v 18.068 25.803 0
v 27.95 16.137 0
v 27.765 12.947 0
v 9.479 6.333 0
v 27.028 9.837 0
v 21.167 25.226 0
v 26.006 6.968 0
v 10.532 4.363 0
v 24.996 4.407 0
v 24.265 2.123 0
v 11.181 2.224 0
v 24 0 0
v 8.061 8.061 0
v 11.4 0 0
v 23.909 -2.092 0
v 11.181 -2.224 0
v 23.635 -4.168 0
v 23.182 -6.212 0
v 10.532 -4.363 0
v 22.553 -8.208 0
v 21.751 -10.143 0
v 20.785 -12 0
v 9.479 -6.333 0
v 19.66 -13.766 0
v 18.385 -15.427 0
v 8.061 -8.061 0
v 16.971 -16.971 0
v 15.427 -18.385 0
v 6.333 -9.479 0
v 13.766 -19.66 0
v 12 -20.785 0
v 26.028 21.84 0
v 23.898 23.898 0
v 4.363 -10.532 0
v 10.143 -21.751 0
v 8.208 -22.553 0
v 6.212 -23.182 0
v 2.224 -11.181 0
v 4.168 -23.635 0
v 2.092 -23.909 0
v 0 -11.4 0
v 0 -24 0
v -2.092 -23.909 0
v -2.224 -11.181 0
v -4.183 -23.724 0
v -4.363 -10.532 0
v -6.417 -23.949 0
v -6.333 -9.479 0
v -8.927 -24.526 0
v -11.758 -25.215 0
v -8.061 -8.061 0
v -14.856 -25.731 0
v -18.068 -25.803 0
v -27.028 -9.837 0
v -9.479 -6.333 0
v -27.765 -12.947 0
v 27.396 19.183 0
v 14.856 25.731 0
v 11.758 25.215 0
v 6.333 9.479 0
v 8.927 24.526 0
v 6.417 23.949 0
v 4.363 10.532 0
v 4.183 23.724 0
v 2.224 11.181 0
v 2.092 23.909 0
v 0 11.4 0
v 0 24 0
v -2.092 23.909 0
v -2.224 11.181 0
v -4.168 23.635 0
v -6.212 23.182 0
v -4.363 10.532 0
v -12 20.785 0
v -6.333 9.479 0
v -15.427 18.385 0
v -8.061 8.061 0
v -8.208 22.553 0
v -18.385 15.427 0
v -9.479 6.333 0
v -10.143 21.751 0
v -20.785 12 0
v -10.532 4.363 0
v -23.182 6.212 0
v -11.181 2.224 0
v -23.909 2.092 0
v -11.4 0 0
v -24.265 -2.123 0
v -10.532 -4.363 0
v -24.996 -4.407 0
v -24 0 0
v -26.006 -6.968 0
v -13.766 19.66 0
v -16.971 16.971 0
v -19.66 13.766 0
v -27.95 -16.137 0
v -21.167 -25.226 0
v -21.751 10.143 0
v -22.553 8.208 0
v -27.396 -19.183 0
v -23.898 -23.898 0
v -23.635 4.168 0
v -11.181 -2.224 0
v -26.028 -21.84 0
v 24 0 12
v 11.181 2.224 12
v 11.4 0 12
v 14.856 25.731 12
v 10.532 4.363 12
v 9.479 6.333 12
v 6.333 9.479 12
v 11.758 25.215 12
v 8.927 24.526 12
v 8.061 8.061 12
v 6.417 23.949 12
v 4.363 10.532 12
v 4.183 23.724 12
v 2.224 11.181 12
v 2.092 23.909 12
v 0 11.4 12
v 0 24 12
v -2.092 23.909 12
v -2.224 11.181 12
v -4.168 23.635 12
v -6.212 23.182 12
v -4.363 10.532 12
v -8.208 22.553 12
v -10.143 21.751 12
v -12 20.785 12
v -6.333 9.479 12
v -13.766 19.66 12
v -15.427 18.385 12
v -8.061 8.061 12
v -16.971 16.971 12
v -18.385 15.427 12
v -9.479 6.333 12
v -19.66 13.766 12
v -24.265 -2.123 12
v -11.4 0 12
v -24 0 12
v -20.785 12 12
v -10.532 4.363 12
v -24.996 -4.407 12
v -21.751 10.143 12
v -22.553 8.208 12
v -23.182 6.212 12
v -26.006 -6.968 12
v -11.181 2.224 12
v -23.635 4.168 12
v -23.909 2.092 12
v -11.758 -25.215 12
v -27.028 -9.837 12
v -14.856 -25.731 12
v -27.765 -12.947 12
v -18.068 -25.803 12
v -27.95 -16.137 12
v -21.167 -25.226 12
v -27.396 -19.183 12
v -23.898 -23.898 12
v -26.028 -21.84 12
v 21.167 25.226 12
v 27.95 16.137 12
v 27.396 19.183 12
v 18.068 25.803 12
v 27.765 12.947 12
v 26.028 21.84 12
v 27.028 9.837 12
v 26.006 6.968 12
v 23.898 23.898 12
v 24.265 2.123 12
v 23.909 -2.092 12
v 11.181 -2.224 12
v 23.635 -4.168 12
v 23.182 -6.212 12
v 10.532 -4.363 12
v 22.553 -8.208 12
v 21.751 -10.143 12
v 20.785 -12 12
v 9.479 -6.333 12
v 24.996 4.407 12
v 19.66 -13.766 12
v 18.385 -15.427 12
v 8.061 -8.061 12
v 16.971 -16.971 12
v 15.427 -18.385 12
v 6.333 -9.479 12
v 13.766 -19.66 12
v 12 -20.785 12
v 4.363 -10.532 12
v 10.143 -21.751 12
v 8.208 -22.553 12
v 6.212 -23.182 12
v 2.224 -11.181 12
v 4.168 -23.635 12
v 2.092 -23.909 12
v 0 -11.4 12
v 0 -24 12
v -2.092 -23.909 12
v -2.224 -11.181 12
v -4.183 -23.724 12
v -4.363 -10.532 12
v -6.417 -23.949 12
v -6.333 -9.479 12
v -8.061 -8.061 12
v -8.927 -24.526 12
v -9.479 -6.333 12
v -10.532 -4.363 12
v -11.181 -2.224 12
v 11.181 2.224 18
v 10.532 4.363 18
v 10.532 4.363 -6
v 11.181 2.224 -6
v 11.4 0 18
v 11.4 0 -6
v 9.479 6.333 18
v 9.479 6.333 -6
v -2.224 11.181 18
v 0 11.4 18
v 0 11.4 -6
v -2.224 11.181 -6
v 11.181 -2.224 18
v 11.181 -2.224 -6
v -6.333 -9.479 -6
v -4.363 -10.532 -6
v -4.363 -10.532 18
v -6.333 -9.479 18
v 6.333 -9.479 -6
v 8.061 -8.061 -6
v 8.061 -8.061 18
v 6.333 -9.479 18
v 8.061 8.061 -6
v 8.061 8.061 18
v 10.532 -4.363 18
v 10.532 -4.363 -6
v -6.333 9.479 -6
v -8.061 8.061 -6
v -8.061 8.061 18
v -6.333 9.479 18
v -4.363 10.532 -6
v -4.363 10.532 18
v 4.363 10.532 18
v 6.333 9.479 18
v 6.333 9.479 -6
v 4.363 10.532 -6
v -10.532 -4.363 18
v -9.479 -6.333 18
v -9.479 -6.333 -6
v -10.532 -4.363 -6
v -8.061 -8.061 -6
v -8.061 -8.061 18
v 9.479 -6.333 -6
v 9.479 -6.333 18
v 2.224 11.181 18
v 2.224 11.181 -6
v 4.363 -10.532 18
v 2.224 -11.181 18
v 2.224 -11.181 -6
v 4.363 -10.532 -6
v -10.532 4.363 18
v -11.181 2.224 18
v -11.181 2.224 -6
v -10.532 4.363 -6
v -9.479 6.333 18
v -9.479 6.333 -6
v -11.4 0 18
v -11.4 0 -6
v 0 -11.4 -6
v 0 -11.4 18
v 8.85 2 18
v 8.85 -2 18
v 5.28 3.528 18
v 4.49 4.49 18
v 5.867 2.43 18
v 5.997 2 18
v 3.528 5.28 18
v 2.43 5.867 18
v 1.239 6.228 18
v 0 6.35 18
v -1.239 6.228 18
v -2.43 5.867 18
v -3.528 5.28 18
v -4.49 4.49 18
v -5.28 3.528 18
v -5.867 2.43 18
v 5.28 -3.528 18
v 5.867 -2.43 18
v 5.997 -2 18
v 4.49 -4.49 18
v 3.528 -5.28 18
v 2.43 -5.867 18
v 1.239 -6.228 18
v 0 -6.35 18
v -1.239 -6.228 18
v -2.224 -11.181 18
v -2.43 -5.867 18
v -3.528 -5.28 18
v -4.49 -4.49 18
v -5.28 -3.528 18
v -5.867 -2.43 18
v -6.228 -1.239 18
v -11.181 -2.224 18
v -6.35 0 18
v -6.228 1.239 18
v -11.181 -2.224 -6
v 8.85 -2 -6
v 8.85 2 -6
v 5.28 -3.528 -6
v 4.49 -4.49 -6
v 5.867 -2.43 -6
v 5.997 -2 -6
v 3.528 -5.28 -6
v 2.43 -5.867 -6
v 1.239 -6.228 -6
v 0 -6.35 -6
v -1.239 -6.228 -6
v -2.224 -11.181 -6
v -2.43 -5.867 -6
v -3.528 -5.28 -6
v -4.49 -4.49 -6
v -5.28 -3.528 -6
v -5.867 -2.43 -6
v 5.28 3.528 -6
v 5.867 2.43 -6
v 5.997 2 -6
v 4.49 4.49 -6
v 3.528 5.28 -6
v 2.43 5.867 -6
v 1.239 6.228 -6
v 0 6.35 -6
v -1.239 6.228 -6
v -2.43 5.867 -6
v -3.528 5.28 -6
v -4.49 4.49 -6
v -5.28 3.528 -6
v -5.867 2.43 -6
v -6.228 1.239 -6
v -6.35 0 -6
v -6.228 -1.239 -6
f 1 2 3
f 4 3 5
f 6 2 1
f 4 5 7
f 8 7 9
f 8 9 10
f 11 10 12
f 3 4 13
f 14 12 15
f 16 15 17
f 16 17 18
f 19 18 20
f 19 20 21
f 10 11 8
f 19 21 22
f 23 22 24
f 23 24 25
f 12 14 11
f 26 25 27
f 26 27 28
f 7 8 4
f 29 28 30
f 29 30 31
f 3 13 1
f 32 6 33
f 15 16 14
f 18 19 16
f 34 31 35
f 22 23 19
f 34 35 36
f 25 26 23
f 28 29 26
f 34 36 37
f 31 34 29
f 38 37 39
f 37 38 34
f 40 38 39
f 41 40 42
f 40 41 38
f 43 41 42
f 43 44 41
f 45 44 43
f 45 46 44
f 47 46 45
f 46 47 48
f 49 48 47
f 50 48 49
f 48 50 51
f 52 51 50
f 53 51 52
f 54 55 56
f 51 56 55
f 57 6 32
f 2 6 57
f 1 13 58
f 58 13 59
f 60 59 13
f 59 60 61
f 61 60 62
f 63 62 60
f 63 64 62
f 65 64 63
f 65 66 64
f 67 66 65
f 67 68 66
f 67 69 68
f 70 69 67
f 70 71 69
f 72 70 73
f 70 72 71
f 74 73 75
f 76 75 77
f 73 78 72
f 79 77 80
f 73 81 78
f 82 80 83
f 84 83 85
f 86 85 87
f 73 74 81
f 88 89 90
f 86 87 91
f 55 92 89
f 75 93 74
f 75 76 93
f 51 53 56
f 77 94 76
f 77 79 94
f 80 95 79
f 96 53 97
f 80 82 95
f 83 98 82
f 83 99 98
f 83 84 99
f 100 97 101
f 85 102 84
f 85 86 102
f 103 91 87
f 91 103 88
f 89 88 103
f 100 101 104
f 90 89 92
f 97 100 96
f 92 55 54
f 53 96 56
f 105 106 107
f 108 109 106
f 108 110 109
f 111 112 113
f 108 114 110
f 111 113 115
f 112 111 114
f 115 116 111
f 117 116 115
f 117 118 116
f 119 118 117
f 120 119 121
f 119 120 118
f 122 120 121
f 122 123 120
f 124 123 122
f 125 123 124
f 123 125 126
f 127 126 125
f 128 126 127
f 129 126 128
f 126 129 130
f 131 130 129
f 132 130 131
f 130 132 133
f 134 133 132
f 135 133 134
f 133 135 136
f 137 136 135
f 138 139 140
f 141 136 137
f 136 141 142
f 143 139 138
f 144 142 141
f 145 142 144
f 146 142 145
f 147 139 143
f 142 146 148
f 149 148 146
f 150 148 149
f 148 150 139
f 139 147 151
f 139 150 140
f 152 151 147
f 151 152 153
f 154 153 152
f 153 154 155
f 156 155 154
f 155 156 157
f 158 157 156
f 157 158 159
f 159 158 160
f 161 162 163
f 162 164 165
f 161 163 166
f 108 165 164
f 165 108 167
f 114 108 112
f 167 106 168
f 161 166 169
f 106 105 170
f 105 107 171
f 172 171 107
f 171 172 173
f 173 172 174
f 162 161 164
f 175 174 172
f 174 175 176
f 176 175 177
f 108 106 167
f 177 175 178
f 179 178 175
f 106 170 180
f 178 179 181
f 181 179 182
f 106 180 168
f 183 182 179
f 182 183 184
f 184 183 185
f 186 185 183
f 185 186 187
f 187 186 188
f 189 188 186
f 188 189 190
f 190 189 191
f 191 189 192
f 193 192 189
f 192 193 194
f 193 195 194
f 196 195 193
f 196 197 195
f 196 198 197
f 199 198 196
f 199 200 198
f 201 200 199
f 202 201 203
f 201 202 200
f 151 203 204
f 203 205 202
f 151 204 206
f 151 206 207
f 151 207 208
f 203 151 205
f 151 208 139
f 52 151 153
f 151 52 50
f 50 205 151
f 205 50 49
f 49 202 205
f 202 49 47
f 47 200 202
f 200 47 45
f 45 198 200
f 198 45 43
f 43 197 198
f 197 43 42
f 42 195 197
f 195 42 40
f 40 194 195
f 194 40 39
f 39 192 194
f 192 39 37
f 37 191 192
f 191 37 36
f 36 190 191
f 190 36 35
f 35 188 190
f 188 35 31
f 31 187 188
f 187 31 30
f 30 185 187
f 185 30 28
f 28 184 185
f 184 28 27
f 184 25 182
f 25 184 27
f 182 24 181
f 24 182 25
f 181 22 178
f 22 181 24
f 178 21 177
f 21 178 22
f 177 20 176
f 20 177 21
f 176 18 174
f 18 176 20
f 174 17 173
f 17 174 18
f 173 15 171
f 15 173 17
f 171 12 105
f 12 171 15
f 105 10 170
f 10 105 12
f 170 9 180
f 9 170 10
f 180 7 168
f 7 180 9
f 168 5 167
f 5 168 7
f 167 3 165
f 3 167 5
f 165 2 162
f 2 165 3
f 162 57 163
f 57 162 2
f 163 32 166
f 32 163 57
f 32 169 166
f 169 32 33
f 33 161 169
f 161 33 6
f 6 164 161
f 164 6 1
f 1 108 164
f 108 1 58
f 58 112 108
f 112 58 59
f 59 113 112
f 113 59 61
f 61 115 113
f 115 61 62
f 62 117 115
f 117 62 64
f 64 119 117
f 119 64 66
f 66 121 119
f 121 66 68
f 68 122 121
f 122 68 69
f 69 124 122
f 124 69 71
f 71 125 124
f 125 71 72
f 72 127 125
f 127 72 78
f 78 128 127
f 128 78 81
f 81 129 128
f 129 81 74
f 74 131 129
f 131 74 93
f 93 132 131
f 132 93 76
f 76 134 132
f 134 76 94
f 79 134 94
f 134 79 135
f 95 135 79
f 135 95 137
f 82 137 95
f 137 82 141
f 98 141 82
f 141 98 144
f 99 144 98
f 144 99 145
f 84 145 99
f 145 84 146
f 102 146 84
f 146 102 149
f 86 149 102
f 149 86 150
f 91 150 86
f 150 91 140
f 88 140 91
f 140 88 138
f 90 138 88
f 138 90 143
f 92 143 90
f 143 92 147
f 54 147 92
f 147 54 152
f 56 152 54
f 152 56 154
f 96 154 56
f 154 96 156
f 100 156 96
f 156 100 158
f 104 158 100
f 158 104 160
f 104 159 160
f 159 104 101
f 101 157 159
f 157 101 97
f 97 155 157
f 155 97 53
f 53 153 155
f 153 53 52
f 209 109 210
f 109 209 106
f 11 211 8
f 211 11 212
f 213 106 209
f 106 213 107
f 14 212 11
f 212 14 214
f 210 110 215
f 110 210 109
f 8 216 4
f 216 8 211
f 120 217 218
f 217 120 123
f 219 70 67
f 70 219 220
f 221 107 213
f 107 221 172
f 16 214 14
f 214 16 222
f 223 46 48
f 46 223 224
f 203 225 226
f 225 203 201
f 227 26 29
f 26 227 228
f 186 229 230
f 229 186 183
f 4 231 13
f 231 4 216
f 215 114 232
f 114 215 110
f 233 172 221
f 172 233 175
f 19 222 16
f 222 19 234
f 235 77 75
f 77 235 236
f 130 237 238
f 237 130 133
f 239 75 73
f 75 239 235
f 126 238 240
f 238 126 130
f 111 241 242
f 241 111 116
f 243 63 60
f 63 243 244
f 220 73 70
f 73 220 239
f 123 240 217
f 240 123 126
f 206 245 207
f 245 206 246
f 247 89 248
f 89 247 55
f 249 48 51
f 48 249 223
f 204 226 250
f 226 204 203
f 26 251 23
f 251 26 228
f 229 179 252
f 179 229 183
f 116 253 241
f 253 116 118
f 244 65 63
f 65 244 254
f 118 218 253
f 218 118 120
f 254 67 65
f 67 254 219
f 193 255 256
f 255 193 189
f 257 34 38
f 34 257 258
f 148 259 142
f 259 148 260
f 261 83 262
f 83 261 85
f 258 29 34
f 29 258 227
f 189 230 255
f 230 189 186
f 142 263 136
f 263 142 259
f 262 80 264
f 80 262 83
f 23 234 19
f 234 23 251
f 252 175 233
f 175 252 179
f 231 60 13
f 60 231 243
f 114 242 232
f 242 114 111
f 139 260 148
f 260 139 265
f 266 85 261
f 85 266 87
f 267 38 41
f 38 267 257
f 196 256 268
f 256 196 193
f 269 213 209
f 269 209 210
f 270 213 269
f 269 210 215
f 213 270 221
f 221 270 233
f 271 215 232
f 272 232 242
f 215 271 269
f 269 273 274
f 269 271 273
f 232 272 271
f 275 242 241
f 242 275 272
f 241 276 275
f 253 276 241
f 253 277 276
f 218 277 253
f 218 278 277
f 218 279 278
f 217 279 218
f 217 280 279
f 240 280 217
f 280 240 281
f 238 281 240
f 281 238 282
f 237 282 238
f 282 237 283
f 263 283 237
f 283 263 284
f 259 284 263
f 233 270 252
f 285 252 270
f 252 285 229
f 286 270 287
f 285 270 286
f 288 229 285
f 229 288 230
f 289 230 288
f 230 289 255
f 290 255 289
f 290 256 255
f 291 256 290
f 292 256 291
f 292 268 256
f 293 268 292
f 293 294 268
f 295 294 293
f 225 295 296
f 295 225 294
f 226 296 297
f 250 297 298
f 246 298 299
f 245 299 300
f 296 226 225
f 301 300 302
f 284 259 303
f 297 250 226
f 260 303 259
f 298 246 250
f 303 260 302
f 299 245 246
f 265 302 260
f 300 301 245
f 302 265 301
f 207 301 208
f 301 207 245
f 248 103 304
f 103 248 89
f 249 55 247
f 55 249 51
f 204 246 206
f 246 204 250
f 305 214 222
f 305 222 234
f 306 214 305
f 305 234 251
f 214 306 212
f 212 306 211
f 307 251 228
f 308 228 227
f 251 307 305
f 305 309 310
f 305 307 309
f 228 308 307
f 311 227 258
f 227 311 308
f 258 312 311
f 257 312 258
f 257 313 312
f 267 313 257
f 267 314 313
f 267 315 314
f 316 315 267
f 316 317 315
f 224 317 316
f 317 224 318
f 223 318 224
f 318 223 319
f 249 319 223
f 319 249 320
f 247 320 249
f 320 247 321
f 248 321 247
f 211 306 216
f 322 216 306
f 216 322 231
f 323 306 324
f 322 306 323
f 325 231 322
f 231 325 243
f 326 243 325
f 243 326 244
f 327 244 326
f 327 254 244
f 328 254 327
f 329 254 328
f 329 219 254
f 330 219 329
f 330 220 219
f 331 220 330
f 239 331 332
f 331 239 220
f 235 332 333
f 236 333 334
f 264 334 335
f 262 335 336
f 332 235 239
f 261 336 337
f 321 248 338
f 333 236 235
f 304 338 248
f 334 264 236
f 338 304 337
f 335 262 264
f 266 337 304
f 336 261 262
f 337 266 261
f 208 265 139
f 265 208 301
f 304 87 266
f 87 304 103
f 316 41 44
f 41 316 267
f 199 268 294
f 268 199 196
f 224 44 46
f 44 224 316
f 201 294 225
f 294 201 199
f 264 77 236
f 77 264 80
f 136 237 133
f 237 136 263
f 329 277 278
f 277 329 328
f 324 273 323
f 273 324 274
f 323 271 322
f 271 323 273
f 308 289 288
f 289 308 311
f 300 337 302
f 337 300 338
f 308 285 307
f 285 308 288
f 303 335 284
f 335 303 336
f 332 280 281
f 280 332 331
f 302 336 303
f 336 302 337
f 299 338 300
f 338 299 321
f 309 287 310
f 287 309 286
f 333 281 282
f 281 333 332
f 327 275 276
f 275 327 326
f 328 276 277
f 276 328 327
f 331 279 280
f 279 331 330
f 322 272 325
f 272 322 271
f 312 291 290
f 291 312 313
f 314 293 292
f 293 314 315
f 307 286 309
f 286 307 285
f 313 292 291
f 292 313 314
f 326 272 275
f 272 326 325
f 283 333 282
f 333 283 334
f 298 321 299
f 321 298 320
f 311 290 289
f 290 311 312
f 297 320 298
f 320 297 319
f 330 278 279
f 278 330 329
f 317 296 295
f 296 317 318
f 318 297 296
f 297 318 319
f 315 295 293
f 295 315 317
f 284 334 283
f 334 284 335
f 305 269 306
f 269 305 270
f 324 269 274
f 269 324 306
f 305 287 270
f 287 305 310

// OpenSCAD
$fn = 32;

// ----------------------------------------------------------------------
// Cam: base radius 24 mm with a 10 mm lift over 150 degrees
// ----------------------------------------------------------------------

// --- parameters (mm) ---
base_r = 24;              // base radius
lift = 10;                // lift height above the base radius
lift_span = 150;          // angular width of the lift
lift_start = 0;           // angle where the lift starts
cam_t = 12;               // cam plate thickness
hub_d = 22.8;             // hub diameter
hub_h = 24;               // hub height
bore_d = 12.7;            // bore
key_w = 4;                // keyway width
key_depth = 2;            // keyway depth

cam_profile = [[24, 0], [24.265, 2.123], [24.996, 4.407], [26.006, 6.968], [27.028, 9.837], [27.765, 12.947], [27.95, 16.137], [27.396, 19.183], [26.028, 21.84], [23.898, 23.898], [21.167, 25.226], [18.068, 25.803], [14.856, 25.731], [11.758, 25.215], [8.927, 24.526], [6.417, 23.949], [4.183, 23.724], [2.092, 23.909], [0, 24], [-2.092, 23.909], [-4.168, 23.635], [-6.212, 23.182], [-8.208, 22.553], [-10.143, 21.751], [-12, 20.785], [-13.766, 19.66], [-15.427, 18.385], [-16.971, 16.971], [-18.385, 15.427], [-19.66, 13.766], [-20.785, 12], [-21.751, 10.143], [-22.553, 8.208], [-23.182, 6.212], [-23.635, 4.168], [-23.909, 2.092], [-24, 0], [-24.265, -2.123], [-24.996, -4.407], [-26.006, -6.968], [-27.028, -9.837], [-27.765, -12.947], [-27.95, -16.137], [-27.396, -19.183], [-26.028, -21.84], [-23.898, -23.898], [-21.167, -25.226], [-18.068, -25.803], [-14.856, -25.731], [-11.758, -25.215], [-8.927, -24.526], [-6.417, -23.949], [-4.183, -23.724], [-2.092, -23.909], [0, -24], [2.092, -23.909], [4.168, -23.635], [6.212, -23.182], [8.208, -22.553], [10.143, -21.751], [12, -20.785], [13.766, -19.66], [15.427, -18.385], [16.971, -16.971], [18.385, -15.427], [19.66, -13.766], [20.785, -12], [21.751, -10.143], [22.553, -8.208], [23.182, -6.212], [23.635, -4.168], [23.909, -2.092]];

difference() {
  union() {
    linear_extrude(height = cam_t) polygon(cam_profile);
    /* hub, proud of the cam plate on both sides */
    translate([0, 0, -6]) cylinder(h = hub_h, d = hub_d);
  }
  /* bore through the hub, 2.5 mm clear on both faces */
  translate([0, 0, -8.5]) cylinder(h = hub_h + 5, d = bore_d);
  /* keyway, milled through the whole hub */
  translate([4.35, -2, -8.5]) cube([4.5, 4, 29]);
}
